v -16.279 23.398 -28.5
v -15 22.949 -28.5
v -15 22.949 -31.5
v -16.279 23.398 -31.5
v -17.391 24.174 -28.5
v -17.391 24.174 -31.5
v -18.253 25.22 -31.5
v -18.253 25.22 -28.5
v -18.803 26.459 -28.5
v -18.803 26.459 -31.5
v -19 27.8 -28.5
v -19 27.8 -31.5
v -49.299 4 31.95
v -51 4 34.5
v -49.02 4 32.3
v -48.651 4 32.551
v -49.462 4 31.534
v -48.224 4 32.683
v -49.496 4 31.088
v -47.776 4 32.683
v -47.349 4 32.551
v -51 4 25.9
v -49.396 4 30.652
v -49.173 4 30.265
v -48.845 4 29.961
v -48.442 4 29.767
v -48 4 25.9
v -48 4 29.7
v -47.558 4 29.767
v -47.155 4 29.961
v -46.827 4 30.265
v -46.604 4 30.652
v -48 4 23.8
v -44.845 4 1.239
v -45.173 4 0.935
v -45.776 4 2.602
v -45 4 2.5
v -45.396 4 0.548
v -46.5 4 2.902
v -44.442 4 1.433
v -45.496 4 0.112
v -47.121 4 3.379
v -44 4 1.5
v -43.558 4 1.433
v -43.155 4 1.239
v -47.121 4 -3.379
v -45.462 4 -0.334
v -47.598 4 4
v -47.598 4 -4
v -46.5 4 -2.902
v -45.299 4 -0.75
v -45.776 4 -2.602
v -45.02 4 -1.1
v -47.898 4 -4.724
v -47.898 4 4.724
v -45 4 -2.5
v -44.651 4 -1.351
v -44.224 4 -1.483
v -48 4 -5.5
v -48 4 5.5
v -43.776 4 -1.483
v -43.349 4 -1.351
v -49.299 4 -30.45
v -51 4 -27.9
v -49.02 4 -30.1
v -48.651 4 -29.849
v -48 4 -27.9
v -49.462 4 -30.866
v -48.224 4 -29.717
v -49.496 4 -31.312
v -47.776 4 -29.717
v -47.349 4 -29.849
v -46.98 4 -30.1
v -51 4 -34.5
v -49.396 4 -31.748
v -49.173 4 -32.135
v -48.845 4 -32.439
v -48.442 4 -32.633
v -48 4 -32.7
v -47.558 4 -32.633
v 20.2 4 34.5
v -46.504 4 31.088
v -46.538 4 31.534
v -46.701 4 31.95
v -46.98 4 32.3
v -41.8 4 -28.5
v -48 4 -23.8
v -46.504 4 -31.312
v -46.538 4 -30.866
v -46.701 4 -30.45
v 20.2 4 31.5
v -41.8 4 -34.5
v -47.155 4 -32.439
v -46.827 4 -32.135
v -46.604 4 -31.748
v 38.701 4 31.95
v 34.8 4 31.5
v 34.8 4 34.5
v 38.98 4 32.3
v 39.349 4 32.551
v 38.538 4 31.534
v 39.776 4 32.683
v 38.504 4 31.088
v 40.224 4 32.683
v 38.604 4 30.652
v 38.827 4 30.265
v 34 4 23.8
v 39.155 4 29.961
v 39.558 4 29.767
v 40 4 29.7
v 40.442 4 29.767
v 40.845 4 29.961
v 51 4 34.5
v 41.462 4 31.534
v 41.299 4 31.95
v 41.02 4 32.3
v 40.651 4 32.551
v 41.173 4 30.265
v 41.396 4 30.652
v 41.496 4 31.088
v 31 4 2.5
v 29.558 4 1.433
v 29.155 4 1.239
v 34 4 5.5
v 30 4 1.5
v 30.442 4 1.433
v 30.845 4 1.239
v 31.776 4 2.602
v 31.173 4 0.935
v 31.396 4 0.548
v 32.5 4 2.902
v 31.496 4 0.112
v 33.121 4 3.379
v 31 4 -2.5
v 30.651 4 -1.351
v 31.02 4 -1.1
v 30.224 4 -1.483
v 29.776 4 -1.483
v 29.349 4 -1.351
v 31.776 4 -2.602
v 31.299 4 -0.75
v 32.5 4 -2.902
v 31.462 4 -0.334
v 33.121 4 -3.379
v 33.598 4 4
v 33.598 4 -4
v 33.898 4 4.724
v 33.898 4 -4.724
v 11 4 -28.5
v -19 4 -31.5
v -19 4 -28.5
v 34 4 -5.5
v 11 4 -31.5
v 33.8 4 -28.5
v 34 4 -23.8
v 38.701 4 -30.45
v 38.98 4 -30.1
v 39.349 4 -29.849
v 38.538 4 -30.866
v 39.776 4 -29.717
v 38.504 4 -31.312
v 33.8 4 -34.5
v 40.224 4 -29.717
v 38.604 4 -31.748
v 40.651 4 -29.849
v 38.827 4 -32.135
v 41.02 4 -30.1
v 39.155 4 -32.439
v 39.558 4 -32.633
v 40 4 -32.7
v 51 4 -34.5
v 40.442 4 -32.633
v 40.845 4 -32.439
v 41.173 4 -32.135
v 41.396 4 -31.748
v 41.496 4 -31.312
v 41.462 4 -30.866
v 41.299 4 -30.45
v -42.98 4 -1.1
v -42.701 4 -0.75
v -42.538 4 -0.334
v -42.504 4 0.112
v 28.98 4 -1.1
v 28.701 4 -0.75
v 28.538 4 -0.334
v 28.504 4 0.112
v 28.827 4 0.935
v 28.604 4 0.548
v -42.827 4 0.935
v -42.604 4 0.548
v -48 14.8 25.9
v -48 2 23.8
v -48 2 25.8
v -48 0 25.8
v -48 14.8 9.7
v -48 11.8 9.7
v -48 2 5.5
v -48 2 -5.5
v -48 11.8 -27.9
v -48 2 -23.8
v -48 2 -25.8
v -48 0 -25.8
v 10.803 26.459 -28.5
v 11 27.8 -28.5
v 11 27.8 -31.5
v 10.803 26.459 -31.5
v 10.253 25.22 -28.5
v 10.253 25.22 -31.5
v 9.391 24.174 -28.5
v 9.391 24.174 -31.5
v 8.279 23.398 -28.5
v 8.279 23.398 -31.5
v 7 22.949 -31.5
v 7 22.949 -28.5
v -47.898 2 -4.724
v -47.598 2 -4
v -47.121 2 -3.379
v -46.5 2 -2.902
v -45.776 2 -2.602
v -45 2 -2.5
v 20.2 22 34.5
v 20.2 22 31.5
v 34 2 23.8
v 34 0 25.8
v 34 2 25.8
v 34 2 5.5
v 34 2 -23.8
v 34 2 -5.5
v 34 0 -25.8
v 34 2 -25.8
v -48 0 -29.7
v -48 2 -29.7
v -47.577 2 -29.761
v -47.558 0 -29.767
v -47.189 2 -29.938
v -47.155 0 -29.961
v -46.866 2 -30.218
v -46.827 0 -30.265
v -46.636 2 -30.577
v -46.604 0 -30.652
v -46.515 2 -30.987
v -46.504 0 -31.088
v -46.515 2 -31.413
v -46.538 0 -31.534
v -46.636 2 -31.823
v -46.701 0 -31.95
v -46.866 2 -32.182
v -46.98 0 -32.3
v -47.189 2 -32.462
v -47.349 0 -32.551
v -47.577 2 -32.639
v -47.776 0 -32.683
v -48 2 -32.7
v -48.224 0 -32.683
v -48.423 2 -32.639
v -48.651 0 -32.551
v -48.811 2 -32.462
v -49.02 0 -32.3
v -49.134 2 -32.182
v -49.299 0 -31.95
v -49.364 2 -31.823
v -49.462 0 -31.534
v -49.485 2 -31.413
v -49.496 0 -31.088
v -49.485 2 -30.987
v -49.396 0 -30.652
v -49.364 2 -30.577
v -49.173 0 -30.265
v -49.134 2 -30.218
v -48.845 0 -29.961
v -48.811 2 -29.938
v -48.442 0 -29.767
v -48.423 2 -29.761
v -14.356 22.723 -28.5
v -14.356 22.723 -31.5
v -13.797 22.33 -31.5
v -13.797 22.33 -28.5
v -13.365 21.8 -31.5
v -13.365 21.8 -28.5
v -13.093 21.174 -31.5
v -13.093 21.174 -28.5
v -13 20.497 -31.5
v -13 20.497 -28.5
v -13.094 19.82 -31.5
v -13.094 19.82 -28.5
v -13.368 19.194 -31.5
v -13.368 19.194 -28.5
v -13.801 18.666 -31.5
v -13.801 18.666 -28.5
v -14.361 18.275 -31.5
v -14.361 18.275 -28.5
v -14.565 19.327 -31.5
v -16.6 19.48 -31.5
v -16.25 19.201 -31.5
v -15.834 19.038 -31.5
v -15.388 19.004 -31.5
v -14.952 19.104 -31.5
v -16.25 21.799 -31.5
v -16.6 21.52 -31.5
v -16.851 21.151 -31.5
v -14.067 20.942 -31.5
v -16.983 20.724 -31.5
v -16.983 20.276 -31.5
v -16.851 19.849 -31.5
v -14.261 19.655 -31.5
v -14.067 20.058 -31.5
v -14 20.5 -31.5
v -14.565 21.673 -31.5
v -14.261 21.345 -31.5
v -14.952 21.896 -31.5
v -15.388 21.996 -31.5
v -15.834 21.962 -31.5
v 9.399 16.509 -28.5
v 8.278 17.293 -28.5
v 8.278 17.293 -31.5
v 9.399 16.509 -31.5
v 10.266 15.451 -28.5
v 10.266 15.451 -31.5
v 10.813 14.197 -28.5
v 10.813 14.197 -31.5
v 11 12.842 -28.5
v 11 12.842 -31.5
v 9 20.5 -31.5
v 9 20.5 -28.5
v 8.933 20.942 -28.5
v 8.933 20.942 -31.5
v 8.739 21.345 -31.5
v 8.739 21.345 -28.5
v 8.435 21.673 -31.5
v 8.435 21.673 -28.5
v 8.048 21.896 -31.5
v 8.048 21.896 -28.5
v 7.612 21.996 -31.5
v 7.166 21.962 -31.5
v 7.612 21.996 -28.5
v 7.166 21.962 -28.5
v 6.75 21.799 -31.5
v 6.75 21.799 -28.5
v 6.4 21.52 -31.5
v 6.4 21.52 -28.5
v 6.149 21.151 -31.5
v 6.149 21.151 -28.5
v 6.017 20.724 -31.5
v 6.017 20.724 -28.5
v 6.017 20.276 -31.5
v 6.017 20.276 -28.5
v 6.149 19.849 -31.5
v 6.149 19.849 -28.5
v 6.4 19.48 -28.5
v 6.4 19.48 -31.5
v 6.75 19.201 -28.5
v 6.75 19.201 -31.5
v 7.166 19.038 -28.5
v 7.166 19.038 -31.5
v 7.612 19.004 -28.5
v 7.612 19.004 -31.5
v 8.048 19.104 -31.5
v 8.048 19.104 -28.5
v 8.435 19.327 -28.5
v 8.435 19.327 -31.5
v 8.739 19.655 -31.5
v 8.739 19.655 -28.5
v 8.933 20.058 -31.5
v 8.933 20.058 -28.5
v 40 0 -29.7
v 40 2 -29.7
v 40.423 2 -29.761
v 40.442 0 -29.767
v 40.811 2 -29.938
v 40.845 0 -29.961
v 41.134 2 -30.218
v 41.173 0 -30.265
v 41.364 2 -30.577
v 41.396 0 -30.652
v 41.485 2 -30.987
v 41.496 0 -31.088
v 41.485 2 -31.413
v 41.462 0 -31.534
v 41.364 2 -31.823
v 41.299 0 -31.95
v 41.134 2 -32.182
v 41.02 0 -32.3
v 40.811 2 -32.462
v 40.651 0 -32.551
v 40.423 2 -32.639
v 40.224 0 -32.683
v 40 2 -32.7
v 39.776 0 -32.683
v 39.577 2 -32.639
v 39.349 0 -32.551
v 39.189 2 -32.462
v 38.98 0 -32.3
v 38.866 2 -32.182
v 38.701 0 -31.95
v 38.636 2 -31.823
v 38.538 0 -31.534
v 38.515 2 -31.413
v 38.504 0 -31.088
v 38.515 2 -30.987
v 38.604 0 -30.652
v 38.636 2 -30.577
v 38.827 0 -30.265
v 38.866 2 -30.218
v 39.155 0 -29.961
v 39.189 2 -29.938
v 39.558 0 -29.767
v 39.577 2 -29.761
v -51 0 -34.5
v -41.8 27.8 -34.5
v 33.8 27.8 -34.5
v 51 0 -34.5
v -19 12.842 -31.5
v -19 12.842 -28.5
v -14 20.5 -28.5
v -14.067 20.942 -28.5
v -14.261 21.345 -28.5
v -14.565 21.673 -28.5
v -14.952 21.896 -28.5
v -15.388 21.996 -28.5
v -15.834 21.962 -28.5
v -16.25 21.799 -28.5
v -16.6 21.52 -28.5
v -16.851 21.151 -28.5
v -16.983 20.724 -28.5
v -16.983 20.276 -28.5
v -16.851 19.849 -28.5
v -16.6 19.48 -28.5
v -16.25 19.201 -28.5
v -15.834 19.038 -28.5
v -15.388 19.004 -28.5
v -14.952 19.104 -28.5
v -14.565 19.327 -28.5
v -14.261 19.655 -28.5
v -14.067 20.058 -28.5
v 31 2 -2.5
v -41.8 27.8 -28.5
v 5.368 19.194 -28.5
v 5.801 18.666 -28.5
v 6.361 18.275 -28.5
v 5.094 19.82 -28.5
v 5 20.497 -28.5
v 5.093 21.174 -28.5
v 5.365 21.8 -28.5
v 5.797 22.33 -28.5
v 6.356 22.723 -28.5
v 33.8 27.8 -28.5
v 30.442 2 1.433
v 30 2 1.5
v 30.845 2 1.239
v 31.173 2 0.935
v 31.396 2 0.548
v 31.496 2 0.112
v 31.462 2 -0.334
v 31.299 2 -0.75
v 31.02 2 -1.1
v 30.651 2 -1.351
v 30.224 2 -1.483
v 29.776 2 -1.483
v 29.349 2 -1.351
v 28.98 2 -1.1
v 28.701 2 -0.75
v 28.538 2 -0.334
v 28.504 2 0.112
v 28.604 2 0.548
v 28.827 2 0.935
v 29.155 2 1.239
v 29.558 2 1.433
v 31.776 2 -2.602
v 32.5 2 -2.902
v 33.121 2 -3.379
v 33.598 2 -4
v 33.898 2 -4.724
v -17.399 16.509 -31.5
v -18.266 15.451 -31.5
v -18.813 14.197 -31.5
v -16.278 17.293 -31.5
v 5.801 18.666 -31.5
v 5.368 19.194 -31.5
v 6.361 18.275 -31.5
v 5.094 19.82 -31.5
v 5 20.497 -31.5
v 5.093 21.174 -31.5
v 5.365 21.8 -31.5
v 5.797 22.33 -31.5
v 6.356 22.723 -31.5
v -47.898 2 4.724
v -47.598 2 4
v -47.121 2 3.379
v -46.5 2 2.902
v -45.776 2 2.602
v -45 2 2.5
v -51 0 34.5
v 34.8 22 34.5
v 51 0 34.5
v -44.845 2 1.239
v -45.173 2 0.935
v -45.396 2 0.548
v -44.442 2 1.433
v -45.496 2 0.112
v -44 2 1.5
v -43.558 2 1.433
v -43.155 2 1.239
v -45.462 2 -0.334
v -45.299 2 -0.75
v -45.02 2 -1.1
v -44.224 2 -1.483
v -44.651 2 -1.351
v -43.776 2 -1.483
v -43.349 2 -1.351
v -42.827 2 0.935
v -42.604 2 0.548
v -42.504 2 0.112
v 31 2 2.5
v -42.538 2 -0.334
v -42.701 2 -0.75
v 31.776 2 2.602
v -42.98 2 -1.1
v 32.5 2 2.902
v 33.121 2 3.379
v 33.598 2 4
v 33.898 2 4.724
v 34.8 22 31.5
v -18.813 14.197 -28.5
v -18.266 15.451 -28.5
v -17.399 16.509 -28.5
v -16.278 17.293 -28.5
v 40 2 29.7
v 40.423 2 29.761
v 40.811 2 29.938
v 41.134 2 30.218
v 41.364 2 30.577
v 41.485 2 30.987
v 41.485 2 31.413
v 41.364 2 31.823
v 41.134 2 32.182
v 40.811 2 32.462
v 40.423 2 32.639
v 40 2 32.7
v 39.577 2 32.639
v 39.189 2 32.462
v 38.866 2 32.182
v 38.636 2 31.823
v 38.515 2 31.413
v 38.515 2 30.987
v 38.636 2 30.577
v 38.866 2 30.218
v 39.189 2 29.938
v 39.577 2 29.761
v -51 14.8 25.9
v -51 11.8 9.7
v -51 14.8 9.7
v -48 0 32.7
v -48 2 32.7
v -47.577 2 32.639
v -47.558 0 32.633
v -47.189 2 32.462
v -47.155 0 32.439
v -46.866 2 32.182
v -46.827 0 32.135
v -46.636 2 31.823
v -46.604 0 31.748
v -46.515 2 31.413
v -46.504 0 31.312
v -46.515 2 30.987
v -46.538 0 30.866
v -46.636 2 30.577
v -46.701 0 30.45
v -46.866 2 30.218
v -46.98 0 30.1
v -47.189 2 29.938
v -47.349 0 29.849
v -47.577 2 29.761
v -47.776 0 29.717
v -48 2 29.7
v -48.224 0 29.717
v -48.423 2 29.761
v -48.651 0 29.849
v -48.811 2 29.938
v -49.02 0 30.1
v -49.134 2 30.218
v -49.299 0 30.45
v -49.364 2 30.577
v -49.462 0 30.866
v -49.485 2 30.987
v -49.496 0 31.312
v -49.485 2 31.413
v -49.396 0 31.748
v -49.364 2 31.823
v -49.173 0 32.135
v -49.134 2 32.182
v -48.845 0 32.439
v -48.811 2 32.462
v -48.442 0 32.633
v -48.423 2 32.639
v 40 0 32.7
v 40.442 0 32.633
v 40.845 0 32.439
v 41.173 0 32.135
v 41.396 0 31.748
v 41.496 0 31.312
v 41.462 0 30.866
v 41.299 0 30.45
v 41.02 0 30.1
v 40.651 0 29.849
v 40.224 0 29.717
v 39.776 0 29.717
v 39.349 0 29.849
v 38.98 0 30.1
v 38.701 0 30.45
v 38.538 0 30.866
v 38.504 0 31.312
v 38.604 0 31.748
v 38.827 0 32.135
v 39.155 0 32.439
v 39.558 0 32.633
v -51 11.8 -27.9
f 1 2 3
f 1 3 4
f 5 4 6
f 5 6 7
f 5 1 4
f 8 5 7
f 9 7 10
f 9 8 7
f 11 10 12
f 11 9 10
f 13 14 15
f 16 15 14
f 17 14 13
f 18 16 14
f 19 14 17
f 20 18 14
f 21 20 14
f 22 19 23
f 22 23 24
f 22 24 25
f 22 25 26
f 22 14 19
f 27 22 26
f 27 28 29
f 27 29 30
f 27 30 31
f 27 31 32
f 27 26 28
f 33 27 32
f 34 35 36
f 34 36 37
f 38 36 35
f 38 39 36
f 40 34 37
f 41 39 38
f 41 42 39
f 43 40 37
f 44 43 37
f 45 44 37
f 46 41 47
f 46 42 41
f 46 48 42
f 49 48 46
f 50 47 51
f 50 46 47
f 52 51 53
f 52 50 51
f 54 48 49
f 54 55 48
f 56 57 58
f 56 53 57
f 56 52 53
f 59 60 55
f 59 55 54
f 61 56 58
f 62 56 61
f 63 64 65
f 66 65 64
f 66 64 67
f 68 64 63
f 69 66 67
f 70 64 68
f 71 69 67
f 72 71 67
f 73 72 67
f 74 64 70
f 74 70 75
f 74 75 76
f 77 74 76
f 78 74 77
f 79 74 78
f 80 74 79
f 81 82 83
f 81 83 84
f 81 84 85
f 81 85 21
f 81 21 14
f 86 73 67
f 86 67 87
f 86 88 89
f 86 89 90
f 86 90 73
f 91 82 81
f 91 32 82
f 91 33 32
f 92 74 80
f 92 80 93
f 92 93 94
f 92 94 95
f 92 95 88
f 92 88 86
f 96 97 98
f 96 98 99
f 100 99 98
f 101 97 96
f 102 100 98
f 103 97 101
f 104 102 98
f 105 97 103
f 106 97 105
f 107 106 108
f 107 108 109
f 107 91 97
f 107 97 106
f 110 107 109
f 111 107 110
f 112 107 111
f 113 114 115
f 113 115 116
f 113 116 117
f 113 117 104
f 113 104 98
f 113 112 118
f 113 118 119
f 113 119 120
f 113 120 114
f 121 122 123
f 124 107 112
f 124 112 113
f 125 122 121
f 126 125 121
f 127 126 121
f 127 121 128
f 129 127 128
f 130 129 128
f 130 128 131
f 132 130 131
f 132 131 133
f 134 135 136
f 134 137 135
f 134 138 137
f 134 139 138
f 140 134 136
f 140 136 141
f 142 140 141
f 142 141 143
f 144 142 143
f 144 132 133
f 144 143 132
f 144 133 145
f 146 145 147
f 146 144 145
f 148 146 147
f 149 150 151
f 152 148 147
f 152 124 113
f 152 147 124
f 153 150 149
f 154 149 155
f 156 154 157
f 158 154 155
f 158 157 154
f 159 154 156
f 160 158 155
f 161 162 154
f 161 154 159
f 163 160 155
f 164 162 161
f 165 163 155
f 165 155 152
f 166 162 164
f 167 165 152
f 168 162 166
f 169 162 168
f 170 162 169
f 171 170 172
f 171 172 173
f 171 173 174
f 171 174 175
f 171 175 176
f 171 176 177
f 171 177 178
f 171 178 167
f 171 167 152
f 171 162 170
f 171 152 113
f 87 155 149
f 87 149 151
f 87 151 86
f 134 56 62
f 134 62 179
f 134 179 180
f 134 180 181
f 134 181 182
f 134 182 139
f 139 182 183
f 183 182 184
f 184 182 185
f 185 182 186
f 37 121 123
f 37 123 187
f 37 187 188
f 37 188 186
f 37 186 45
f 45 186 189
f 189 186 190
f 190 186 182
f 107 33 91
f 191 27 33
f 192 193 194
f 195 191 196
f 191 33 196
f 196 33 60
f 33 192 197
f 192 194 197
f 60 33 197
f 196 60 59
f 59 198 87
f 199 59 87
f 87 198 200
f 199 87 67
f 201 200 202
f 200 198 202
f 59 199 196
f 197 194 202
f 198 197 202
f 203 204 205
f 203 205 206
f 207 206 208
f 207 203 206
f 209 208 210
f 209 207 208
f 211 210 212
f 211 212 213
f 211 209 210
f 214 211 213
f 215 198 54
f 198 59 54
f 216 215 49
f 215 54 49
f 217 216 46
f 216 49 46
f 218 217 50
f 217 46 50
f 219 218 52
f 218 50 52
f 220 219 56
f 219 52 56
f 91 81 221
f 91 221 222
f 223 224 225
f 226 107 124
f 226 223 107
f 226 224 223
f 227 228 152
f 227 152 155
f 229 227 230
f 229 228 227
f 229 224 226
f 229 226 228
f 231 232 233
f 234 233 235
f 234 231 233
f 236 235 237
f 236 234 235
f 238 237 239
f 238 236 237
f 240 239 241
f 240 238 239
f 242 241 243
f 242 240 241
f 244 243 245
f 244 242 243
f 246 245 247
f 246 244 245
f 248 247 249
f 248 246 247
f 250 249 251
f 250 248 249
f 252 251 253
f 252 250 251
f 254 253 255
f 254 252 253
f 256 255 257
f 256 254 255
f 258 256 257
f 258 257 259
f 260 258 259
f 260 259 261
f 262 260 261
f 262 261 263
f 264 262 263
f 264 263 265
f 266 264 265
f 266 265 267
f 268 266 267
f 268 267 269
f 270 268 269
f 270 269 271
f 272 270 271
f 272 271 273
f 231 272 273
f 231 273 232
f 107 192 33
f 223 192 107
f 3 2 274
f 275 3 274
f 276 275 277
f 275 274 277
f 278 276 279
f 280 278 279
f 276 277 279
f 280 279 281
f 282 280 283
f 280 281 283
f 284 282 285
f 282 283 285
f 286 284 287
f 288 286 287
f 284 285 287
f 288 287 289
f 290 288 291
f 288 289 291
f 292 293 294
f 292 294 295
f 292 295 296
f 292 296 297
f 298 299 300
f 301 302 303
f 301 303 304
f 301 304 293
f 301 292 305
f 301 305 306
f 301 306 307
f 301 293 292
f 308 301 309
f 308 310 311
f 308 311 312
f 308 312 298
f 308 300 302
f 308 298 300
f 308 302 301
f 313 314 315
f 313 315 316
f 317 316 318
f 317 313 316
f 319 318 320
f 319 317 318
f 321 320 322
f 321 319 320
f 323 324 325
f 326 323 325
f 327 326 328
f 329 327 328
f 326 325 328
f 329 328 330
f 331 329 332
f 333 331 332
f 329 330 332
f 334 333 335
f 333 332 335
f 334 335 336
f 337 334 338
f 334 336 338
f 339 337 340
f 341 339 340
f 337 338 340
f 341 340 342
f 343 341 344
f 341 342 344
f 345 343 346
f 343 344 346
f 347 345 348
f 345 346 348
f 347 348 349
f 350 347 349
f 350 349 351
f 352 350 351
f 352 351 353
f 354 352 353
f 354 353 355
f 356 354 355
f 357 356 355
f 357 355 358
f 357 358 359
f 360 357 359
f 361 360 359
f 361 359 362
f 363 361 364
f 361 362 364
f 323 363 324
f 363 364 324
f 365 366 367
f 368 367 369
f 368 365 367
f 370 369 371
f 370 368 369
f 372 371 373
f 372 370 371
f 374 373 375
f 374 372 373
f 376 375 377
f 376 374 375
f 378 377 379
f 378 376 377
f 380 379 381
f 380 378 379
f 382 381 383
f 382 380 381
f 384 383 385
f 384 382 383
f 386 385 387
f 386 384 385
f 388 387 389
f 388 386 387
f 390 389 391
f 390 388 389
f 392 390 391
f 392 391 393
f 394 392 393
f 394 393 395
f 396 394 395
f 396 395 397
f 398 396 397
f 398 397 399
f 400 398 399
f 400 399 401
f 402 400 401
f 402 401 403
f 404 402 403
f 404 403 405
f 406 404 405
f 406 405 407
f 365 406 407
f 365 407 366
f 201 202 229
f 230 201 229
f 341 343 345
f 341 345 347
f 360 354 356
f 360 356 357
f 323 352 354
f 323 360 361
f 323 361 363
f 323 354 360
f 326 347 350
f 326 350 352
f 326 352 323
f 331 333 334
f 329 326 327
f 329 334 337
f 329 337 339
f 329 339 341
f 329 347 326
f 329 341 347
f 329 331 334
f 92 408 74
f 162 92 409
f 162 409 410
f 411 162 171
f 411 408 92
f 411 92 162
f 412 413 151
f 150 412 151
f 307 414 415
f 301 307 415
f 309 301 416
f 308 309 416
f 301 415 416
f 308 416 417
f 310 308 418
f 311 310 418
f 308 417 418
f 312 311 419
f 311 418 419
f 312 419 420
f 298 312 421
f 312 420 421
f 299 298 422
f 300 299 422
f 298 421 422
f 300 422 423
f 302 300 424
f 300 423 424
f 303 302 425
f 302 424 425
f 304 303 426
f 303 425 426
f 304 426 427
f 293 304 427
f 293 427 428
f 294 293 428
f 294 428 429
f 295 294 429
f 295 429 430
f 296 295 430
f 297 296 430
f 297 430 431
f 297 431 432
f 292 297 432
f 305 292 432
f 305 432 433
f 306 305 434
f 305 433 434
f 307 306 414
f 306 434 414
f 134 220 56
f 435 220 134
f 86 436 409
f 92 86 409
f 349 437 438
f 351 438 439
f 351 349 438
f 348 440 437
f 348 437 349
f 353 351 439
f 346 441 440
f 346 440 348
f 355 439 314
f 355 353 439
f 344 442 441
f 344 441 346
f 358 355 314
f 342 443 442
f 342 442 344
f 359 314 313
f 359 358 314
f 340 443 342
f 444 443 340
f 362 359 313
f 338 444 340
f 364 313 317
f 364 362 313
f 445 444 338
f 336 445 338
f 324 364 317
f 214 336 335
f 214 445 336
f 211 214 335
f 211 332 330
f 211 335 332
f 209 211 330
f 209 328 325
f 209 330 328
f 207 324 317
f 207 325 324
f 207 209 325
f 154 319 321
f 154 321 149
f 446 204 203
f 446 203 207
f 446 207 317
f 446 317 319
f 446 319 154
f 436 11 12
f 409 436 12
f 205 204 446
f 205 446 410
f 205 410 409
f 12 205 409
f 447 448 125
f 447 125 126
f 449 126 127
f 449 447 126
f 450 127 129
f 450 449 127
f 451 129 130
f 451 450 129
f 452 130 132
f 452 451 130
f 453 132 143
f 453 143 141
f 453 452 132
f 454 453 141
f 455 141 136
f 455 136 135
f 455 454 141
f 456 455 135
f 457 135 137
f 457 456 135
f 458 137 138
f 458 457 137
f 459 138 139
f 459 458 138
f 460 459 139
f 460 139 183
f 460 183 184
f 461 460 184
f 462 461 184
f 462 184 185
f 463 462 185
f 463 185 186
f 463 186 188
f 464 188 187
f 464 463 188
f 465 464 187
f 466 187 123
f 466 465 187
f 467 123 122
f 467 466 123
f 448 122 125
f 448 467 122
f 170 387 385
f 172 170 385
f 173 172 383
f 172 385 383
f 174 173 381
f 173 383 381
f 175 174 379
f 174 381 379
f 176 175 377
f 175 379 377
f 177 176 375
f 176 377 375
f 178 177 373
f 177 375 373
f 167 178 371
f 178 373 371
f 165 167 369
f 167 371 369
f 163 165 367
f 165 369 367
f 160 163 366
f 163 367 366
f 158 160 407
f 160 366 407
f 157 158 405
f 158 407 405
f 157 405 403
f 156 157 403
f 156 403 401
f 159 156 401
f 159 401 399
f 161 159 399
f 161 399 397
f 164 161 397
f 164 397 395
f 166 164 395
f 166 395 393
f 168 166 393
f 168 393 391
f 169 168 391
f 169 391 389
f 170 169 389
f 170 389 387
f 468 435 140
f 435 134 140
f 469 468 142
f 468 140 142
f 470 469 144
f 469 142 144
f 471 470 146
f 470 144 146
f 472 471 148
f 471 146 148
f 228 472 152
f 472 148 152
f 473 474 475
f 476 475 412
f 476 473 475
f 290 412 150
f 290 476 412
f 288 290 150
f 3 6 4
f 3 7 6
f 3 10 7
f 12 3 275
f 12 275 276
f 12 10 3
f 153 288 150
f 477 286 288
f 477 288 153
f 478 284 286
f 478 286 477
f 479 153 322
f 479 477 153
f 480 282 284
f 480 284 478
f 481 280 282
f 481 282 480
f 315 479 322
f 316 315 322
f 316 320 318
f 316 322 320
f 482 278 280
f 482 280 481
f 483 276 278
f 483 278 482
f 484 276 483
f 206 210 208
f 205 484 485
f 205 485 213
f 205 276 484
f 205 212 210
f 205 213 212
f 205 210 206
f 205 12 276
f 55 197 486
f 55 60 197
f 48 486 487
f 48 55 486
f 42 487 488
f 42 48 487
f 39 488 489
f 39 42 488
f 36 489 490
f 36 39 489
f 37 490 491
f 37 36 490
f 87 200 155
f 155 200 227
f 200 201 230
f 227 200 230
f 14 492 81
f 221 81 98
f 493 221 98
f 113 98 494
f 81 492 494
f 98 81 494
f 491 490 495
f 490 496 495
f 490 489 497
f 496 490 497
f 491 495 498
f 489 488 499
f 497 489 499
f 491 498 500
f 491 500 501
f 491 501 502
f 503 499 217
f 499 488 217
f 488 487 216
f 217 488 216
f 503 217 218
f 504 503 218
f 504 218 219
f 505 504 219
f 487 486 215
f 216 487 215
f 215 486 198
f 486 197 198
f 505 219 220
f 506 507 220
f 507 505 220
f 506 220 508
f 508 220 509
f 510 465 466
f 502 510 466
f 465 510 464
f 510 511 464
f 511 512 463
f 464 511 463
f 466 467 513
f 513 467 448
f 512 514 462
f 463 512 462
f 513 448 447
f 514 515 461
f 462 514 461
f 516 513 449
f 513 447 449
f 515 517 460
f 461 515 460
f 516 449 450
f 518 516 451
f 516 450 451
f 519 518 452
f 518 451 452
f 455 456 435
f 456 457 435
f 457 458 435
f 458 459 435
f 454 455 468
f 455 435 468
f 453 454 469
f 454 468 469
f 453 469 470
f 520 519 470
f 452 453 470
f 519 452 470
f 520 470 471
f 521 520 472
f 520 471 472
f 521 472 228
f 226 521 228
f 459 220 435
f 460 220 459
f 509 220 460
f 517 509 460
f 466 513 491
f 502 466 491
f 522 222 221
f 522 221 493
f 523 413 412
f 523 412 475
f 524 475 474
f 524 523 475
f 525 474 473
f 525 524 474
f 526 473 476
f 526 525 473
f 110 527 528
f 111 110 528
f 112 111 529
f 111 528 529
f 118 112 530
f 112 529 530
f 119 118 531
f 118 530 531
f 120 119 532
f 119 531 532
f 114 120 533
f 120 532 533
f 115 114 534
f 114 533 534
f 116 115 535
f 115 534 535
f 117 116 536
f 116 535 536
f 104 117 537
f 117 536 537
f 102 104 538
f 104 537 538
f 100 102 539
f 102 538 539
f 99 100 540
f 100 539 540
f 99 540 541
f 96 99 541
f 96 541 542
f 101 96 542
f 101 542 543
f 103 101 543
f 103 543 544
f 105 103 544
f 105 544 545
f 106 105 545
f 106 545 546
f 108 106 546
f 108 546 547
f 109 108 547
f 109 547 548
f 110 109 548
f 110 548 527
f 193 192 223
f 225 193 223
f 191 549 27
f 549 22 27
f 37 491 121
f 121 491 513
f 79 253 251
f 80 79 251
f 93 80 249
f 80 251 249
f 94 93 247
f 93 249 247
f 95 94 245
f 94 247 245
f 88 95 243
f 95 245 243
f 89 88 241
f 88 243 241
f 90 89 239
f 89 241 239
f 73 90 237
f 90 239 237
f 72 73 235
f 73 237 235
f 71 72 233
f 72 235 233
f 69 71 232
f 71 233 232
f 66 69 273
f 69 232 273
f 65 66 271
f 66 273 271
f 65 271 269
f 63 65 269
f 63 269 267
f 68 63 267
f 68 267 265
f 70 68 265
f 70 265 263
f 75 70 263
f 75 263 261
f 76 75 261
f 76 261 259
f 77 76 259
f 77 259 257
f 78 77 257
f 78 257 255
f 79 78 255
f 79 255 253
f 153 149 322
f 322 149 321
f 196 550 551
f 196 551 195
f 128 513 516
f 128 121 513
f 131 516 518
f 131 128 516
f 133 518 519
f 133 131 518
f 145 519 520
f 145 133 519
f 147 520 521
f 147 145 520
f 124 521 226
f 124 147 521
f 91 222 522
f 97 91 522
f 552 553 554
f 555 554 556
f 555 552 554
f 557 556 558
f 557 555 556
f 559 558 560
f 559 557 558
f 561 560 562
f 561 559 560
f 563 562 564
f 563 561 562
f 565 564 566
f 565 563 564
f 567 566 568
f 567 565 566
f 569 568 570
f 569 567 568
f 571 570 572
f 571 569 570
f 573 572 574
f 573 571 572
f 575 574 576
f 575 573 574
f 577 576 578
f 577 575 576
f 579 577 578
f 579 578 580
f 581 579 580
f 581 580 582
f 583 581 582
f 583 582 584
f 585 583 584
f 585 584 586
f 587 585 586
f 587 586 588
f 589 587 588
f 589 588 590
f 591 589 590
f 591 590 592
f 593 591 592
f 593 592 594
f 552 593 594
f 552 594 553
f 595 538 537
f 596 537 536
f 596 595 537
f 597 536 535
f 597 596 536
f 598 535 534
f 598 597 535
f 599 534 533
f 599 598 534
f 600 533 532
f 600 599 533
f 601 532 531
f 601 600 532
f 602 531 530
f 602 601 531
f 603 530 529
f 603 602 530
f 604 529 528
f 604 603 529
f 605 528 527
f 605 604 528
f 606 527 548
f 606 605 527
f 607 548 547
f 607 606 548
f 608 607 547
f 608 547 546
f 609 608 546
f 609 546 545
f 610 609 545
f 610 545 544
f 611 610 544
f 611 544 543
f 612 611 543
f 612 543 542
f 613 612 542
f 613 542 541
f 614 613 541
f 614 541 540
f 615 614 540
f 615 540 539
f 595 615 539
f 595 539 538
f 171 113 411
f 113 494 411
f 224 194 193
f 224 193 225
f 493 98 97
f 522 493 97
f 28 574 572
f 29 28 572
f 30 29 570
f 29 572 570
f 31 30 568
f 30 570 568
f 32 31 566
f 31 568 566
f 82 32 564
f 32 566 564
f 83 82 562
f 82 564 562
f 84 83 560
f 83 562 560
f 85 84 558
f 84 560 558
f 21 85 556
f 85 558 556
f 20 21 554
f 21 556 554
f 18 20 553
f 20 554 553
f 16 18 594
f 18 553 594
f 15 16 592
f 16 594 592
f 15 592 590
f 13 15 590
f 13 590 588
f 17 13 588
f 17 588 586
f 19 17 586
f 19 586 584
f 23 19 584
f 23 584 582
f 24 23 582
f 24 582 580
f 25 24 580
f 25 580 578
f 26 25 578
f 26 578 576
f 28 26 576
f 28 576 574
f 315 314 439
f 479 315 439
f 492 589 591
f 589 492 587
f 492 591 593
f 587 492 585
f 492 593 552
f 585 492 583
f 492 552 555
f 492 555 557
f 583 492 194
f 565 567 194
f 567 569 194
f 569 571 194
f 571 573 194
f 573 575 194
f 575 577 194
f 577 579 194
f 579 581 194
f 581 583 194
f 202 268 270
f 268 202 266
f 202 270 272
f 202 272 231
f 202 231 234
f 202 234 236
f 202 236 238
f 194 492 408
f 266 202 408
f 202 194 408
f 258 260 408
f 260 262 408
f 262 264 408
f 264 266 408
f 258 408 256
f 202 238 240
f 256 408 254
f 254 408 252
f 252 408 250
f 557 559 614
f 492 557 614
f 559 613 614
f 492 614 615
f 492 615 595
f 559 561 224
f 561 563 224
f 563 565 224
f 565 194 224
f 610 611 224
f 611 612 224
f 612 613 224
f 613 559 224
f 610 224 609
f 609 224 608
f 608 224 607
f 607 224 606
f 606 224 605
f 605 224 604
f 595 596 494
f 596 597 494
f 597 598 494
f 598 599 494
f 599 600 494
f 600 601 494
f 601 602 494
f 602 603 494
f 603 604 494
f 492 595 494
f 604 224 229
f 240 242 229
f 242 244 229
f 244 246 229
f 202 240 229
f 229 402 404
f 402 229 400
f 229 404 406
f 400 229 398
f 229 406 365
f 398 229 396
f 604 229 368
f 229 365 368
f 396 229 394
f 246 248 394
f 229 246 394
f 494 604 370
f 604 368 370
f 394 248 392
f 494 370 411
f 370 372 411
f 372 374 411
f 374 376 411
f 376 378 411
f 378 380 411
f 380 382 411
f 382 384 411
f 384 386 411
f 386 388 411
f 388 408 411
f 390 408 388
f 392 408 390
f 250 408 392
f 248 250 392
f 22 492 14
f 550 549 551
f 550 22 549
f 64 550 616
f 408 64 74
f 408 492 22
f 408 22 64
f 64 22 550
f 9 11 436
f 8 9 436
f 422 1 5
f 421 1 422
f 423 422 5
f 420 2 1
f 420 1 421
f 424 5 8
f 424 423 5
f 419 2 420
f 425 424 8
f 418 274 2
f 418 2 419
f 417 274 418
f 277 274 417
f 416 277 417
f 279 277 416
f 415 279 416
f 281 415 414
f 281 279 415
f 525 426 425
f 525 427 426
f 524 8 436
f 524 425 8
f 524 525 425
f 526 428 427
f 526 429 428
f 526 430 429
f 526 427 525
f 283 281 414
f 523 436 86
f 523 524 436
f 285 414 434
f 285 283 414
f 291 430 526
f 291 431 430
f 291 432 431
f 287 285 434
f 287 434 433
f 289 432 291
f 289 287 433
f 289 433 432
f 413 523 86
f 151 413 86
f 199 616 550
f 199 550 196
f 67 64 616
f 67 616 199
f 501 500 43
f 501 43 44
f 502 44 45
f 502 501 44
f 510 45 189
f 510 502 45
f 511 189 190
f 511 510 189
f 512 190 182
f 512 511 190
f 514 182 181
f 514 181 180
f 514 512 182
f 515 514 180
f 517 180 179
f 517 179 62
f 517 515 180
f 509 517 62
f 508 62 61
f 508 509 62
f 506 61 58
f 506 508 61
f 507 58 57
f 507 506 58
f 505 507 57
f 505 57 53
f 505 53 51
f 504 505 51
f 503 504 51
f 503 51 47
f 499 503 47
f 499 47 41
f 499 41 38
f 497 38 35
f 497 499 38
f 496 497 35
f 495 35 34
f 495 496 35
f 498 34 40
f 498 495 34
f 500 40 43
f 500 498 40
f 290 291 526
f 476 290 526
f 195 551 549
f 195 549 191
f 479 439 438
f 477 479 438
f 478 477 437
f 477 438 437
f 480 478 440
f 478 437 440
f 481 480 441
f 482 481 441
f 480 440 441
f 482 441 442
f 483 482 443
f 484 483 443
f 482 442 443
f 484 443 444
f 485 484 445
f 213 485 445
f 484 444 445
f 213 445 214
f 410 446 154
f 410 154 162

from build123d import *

# Parameters (mm, degrees)
SKETCH1_W           = 102
SKETCH1_H           = 69
SKETCH1_R           = 1.5
SKETCH1_W_2         = 82
SKETCH1_H_2         = 51.6
BOSS_EXTRUDE1_DEPTH = 2
SKETCH2_W           = 102
SKETCH2_H           = 69
SKETCH2_R           = 1.5
SKETCH2_W_2         = 82
SKETCH2_H_2         = 21.3
BOSS_EXTRUDE2_DEPTH = 2
FILLET1_R           = 3
SKETCH3_R           = 1.5
CUT_EXTRUDE1_DEPTH  = 62.605600395
SKETCH9_W           = 75.6
SKETCH9_H           = 6
BOSS_EXTRUDE5_DEPTH = 23.8
SKETCH10_R          = 1.5
CUT_EXTRUDE6_DEPTH  = 3
FILLET3_R           = 5
SKETCH11_W          = 14.6
SKETCH11_H          = 3
BOSS_EXTRUDE6_DEPTH = 18
SKETCH12_W          = 3
SKETCH12_H          = 53.8
BOSS_EXTRUDE7_DEPTH = 7.8
SKETCH13_W          = 3
SKETCH13_H          = 16.2
BOSS_EXTRUDE8_DEPTH = 3


with BuildPart() as part:
    # Sketch1 → Boss-Extrude1 (new body)
    with BuildSketch(Plane(origin=(0, 0, 0), x_dir=(1, 0, 0), z_dir=(0, 1, 0))):
        Rectangle(SKETCH1_W, SKETCH1_H)
        with Locations(Location((-48, 31.2, 0), (0, 0, 270))):
            Circle(SKETCH1_R, mode=Mode.SUBTRACT)
        with Locations(Location((40, 31.2, 0), (0, 0, 270))):
            Circle(SKETCH1_R, mode=Mode.SUBTRACT)
        with Locations(Location((40, -31.2, 0), (0, 0, 270))):
            Circle(SKETCH1_R, mode=Mode.SUBTRACT)
        with Locations(Location((-48, -31.2, 0), (0, 0, 270))):
            Circle(SKETCH1_R, mode=Mode.SUBTRACT)
        with Locations((-7, 0)):
            Rectangle(SKETCH1_W_2, SKETCH1_H_2, mode=Mode.SUBTRACT)
    extrude(amount=BOSS_EXTRUDE1_DEPTH)

    # Sketch2 → Boss-Extrude2 (add)
    with BuildSketch(Plane(origin=(0, 2, 0), x_dir=(1, 0, 0), z_dir=(0, 1, 0))):
        Rectangle(SKETCH2_W, SKETCH2_H)
        with Locations(Location((-44, 0, 0), (0, 0, 270))):
            Circle(SKETCH2_R, mode=Mode.SUBTRACT)
        with Locations(Location((30, 0, 0), (0, 0, 270))):
            Circle(SKETCH2_R, mode=Mode.SUBTRACT)
        with Locations((-7, 13.15)):
            Rectangle(SKETCH2_W_2, SKETCH2_H_2, mode=Mode.SUBTRACT)
        with Locations((-7, -13.15)):
            Rectangle(SKETCH2_W_2, SKETCH2_H_2, mode=Mode.SUBTRACT)
    extrude(amount=BOSS_EXTRUDE2_DEPTH)

    # Fillet1
    fillet1_edges = [part.edges().sort_by_distance(p)[0] for p in [
        (-48, 3, -2.5),
        (34, 3, -2.5),
        (34, 3, 2.5),
        (-48, 3, 2.5),
    ]]
    fillet(fillet1_edges, radius=FILLET1_R)

    # Sketch3 → Cut-Extrude1 (cut, through all)
    with BuildSketch(Plane.XZ.offset(-2)):
        with Locations(Location((-48, 31.2, 0), (0, 0, 270))):
            Circle(SKETCH3_R)
        with Locations(Location((-48, -31.2, 0), (0, 0, 270))):
            Circle(SKETCH3_R)
        with Locations(Location((40, -31.2, 0), (0, 0, 270))):
            Circle(SKETCH3_R)
        with Locations(Location((40, 31.2, 0), (0, 0, 270))):
            Circle(SKETCH3_R)
    extrude(amount=-CUT_EXTRUDE1_DEPTH, mode=Mode.SUBTRACT)

    # Sketch9 → Boss-Extrude5 (add)
    with BuildSketch(Plane(origin=(0, 4, 0), x_dir=(1, 0, 0), z_dir=(0, 1, 0))):
        with Locations((-4, 31.5)):
            Rectangle(SKETCH9_W, SKETCH9_H)
    extrude(amount=BOSS_EXTRUDE5_DEPTH)

    # Sketch10 → Cut-Extrude6 (cut)
    with BuildSketch(Plane.XY.offset(-28.5)):
        with BuildLine():
            Line((11, 27.8), (-19, 27.8))
            Line((-19, 27.8), (-19, 23))
            Line((-19, 23), (-15.5, 23))
            ThreePointArc((-15.5, 23), (-13.069617557, 21.085867885), (-14.360893582, 18.274592943))
            Line((-14.360893582, 18.274592943), (-19, 15.9))
            Line((-19, 15.9), (-19, 4))
            Line((-19, 4), (11, 4))
            Line((11, 4), (11, 15.9))
            Line((11, 15.9), (6.360893582, 18.274592943))
            ThreePointArc((6.360893582, 18.274592943), (5.069617557, 21.085867885), (7.5, 23))
            Line((7.5, 23), (11, 23))
            Line((11, 23), (11, 27.8))
        make_face()
        with Locations((-15.5, 20.5)):
            Circle(SKETCH10_R)
        with Locations((7.5, 20.5)):
            Circle(SKETCH10_R)
    extrude(amount=-CUT_EXTRUDE6_DEPTH, mode=Mode.SUBTRACT)

    # Fillet3
    # the kernel refuses this fillet: 5 mm, written as the material it adds along each edge
    with BuildSketch(Plane(origin=(-19, 15.9, -28.5), x_dir=(0, -1, 0), z_dir=(0, 0, -1))) as fillet3_piece_1:
        with BuildLine():
            CenterArc((FILLET3_R * 0.611525688318, -FILLET3_R), FILLET3_R, 90, 62.893714251)
            Line((-FILLET3_R * 0.278637134463, -FILLET3_R * 0.544357432916), (0, 0))
            Line((0, 0), (FILLET3_R * 0.611525688318, 0))
        make_face()
    extrude(amount=3)
    with BuildSketch(Plane(origin=(11, 15.9, -28.5), x_dir=(0, -1, 0), z_dir=(0, 0, -1))) as fillet3_piece_2:
        with BuildLine():
            CenterArc((FILLET3_R * 0.611525688318, FILLET3_R), FILLET3_R, 207.106285749, 62.893714251)
            Line((-FILLET3_R * 0.278637134463, FILLET3_R * 0.544357432916), (0, 0))
            Line((0, 0), (FILLET3_R * 0.611525688318, 0))
        make_face()
    extrude(amount=3)
    with BuildSketch(Plane(origin=(11, 23, -28.5), x_dir=(-0.9999202818433616, -0.012626557658055267, 0), z_dir=(0, 0, -1))) as fillet3_piece_3_section:
        with BuildLine():
            CenterArc((4.938381933, 4.911215506), FILLET3_R, 180.723467688, 78.463040967)
            Line((-0.061219476, 4.848082717), (-0.561179617, 4.841769438))
            Line((-0.561179617, 4.841769438), (-0.499960141, -0.006313279))
            Line((-0.499960141, -0.006313279), (0.006313279, -0.499960141))
            ThreePointArc((0.006313279, -0.499960141), (3.506034265, -0.455767189), (3.906512595, -0.491121551))
            Line((3.906512595, -0.491121551), (4.000318898, 0))
        make_face()
    fillet3_piece_3 = extrude(amount=3, mode=Mode.PRIVATE)
    fillet3_piece_3 = split(fillet3_piece_3, bisect_by=Plane(origin=(10.155931767, 27.8, -30), z_dir=(0, -1, 0)), keep=Keep.TOP, mode=Mode.PRIVATE)
    add(fillet3_piece_3)
    with BuildSketch(Plane(origin=(-19, 23, -28.5), x_dir=(0, 1, 0), z_dir=(0, 0, -1))) as fillet3_piece_4_section:
        with BuildLine():
            CenterArc((4.848469228, 5), FILLET3_R, 191.536959033, 78.463040967)
            Line((-0.050510257, 4), (-0.540408206, 3.9))
            ThreePointArc((-0.540408206, 3.9), (-0.5, 3.5), (-0.5, 0))
            Line((-0.5, 0), (0, -0.5))
            Line((0, -0.5), (4.848469228, -0.5))
            Line((4.848469228, -0.5), (4.848469228, 0))
        make_face()
    fillet3_piece_4 = extrude(amount=3, mode=Mode.PRIVATE)
    fillet3_piece_4 = split(fillet3_piece_4, bisect_by=Plane(origin=(-18.155931767, 27.8, -30), z_dir=(0, -1, 0)), keep=Keep.TOP, mode=Mode.PRIVATE)
    add(fillet3_piece_4)

    # Sketch11 → Boss-Extrude6 (add)
    with BuildSketch(Plane(origin=(0, 4, 0), x_dir=(1, 0, 0), z_dir=(0, 1, 0))):
        with Locations((27.5, -33)):
            Rectangle(SKETCH11_W, SKETCH11_H)
    extrude(amount=BOSS_EXTRUDE6_DEPTH)

    # Sketch12 → Boss-Extrude7 (add)
    with BuildSketch(Plane(origin=(0, 4, 0), x_dir=(1, 0, 0), z_dir=(0, 1, 0))):
        with Locations((-49.5, 1)):
            Rectangle(SKETCH12_W, SKETCH12_H)
    extrude(amount=BOSS_EXTRUDE7_DEPTH)

    # Sketch13 → Boss-Extrude8 (add)
    with BuildSketch(Plane(origin=(0, 11.8, 0), x_dir=(1, 0, 0), z_dir=(0, 1, 0))):
        with Locations((-49.5, -17.8)):
            Rectangle(SKETCH13_W, SKETCH13_H)
    extrude(amount=BOSS_EXTRUDE8_DEPTH)


solid = part.part
